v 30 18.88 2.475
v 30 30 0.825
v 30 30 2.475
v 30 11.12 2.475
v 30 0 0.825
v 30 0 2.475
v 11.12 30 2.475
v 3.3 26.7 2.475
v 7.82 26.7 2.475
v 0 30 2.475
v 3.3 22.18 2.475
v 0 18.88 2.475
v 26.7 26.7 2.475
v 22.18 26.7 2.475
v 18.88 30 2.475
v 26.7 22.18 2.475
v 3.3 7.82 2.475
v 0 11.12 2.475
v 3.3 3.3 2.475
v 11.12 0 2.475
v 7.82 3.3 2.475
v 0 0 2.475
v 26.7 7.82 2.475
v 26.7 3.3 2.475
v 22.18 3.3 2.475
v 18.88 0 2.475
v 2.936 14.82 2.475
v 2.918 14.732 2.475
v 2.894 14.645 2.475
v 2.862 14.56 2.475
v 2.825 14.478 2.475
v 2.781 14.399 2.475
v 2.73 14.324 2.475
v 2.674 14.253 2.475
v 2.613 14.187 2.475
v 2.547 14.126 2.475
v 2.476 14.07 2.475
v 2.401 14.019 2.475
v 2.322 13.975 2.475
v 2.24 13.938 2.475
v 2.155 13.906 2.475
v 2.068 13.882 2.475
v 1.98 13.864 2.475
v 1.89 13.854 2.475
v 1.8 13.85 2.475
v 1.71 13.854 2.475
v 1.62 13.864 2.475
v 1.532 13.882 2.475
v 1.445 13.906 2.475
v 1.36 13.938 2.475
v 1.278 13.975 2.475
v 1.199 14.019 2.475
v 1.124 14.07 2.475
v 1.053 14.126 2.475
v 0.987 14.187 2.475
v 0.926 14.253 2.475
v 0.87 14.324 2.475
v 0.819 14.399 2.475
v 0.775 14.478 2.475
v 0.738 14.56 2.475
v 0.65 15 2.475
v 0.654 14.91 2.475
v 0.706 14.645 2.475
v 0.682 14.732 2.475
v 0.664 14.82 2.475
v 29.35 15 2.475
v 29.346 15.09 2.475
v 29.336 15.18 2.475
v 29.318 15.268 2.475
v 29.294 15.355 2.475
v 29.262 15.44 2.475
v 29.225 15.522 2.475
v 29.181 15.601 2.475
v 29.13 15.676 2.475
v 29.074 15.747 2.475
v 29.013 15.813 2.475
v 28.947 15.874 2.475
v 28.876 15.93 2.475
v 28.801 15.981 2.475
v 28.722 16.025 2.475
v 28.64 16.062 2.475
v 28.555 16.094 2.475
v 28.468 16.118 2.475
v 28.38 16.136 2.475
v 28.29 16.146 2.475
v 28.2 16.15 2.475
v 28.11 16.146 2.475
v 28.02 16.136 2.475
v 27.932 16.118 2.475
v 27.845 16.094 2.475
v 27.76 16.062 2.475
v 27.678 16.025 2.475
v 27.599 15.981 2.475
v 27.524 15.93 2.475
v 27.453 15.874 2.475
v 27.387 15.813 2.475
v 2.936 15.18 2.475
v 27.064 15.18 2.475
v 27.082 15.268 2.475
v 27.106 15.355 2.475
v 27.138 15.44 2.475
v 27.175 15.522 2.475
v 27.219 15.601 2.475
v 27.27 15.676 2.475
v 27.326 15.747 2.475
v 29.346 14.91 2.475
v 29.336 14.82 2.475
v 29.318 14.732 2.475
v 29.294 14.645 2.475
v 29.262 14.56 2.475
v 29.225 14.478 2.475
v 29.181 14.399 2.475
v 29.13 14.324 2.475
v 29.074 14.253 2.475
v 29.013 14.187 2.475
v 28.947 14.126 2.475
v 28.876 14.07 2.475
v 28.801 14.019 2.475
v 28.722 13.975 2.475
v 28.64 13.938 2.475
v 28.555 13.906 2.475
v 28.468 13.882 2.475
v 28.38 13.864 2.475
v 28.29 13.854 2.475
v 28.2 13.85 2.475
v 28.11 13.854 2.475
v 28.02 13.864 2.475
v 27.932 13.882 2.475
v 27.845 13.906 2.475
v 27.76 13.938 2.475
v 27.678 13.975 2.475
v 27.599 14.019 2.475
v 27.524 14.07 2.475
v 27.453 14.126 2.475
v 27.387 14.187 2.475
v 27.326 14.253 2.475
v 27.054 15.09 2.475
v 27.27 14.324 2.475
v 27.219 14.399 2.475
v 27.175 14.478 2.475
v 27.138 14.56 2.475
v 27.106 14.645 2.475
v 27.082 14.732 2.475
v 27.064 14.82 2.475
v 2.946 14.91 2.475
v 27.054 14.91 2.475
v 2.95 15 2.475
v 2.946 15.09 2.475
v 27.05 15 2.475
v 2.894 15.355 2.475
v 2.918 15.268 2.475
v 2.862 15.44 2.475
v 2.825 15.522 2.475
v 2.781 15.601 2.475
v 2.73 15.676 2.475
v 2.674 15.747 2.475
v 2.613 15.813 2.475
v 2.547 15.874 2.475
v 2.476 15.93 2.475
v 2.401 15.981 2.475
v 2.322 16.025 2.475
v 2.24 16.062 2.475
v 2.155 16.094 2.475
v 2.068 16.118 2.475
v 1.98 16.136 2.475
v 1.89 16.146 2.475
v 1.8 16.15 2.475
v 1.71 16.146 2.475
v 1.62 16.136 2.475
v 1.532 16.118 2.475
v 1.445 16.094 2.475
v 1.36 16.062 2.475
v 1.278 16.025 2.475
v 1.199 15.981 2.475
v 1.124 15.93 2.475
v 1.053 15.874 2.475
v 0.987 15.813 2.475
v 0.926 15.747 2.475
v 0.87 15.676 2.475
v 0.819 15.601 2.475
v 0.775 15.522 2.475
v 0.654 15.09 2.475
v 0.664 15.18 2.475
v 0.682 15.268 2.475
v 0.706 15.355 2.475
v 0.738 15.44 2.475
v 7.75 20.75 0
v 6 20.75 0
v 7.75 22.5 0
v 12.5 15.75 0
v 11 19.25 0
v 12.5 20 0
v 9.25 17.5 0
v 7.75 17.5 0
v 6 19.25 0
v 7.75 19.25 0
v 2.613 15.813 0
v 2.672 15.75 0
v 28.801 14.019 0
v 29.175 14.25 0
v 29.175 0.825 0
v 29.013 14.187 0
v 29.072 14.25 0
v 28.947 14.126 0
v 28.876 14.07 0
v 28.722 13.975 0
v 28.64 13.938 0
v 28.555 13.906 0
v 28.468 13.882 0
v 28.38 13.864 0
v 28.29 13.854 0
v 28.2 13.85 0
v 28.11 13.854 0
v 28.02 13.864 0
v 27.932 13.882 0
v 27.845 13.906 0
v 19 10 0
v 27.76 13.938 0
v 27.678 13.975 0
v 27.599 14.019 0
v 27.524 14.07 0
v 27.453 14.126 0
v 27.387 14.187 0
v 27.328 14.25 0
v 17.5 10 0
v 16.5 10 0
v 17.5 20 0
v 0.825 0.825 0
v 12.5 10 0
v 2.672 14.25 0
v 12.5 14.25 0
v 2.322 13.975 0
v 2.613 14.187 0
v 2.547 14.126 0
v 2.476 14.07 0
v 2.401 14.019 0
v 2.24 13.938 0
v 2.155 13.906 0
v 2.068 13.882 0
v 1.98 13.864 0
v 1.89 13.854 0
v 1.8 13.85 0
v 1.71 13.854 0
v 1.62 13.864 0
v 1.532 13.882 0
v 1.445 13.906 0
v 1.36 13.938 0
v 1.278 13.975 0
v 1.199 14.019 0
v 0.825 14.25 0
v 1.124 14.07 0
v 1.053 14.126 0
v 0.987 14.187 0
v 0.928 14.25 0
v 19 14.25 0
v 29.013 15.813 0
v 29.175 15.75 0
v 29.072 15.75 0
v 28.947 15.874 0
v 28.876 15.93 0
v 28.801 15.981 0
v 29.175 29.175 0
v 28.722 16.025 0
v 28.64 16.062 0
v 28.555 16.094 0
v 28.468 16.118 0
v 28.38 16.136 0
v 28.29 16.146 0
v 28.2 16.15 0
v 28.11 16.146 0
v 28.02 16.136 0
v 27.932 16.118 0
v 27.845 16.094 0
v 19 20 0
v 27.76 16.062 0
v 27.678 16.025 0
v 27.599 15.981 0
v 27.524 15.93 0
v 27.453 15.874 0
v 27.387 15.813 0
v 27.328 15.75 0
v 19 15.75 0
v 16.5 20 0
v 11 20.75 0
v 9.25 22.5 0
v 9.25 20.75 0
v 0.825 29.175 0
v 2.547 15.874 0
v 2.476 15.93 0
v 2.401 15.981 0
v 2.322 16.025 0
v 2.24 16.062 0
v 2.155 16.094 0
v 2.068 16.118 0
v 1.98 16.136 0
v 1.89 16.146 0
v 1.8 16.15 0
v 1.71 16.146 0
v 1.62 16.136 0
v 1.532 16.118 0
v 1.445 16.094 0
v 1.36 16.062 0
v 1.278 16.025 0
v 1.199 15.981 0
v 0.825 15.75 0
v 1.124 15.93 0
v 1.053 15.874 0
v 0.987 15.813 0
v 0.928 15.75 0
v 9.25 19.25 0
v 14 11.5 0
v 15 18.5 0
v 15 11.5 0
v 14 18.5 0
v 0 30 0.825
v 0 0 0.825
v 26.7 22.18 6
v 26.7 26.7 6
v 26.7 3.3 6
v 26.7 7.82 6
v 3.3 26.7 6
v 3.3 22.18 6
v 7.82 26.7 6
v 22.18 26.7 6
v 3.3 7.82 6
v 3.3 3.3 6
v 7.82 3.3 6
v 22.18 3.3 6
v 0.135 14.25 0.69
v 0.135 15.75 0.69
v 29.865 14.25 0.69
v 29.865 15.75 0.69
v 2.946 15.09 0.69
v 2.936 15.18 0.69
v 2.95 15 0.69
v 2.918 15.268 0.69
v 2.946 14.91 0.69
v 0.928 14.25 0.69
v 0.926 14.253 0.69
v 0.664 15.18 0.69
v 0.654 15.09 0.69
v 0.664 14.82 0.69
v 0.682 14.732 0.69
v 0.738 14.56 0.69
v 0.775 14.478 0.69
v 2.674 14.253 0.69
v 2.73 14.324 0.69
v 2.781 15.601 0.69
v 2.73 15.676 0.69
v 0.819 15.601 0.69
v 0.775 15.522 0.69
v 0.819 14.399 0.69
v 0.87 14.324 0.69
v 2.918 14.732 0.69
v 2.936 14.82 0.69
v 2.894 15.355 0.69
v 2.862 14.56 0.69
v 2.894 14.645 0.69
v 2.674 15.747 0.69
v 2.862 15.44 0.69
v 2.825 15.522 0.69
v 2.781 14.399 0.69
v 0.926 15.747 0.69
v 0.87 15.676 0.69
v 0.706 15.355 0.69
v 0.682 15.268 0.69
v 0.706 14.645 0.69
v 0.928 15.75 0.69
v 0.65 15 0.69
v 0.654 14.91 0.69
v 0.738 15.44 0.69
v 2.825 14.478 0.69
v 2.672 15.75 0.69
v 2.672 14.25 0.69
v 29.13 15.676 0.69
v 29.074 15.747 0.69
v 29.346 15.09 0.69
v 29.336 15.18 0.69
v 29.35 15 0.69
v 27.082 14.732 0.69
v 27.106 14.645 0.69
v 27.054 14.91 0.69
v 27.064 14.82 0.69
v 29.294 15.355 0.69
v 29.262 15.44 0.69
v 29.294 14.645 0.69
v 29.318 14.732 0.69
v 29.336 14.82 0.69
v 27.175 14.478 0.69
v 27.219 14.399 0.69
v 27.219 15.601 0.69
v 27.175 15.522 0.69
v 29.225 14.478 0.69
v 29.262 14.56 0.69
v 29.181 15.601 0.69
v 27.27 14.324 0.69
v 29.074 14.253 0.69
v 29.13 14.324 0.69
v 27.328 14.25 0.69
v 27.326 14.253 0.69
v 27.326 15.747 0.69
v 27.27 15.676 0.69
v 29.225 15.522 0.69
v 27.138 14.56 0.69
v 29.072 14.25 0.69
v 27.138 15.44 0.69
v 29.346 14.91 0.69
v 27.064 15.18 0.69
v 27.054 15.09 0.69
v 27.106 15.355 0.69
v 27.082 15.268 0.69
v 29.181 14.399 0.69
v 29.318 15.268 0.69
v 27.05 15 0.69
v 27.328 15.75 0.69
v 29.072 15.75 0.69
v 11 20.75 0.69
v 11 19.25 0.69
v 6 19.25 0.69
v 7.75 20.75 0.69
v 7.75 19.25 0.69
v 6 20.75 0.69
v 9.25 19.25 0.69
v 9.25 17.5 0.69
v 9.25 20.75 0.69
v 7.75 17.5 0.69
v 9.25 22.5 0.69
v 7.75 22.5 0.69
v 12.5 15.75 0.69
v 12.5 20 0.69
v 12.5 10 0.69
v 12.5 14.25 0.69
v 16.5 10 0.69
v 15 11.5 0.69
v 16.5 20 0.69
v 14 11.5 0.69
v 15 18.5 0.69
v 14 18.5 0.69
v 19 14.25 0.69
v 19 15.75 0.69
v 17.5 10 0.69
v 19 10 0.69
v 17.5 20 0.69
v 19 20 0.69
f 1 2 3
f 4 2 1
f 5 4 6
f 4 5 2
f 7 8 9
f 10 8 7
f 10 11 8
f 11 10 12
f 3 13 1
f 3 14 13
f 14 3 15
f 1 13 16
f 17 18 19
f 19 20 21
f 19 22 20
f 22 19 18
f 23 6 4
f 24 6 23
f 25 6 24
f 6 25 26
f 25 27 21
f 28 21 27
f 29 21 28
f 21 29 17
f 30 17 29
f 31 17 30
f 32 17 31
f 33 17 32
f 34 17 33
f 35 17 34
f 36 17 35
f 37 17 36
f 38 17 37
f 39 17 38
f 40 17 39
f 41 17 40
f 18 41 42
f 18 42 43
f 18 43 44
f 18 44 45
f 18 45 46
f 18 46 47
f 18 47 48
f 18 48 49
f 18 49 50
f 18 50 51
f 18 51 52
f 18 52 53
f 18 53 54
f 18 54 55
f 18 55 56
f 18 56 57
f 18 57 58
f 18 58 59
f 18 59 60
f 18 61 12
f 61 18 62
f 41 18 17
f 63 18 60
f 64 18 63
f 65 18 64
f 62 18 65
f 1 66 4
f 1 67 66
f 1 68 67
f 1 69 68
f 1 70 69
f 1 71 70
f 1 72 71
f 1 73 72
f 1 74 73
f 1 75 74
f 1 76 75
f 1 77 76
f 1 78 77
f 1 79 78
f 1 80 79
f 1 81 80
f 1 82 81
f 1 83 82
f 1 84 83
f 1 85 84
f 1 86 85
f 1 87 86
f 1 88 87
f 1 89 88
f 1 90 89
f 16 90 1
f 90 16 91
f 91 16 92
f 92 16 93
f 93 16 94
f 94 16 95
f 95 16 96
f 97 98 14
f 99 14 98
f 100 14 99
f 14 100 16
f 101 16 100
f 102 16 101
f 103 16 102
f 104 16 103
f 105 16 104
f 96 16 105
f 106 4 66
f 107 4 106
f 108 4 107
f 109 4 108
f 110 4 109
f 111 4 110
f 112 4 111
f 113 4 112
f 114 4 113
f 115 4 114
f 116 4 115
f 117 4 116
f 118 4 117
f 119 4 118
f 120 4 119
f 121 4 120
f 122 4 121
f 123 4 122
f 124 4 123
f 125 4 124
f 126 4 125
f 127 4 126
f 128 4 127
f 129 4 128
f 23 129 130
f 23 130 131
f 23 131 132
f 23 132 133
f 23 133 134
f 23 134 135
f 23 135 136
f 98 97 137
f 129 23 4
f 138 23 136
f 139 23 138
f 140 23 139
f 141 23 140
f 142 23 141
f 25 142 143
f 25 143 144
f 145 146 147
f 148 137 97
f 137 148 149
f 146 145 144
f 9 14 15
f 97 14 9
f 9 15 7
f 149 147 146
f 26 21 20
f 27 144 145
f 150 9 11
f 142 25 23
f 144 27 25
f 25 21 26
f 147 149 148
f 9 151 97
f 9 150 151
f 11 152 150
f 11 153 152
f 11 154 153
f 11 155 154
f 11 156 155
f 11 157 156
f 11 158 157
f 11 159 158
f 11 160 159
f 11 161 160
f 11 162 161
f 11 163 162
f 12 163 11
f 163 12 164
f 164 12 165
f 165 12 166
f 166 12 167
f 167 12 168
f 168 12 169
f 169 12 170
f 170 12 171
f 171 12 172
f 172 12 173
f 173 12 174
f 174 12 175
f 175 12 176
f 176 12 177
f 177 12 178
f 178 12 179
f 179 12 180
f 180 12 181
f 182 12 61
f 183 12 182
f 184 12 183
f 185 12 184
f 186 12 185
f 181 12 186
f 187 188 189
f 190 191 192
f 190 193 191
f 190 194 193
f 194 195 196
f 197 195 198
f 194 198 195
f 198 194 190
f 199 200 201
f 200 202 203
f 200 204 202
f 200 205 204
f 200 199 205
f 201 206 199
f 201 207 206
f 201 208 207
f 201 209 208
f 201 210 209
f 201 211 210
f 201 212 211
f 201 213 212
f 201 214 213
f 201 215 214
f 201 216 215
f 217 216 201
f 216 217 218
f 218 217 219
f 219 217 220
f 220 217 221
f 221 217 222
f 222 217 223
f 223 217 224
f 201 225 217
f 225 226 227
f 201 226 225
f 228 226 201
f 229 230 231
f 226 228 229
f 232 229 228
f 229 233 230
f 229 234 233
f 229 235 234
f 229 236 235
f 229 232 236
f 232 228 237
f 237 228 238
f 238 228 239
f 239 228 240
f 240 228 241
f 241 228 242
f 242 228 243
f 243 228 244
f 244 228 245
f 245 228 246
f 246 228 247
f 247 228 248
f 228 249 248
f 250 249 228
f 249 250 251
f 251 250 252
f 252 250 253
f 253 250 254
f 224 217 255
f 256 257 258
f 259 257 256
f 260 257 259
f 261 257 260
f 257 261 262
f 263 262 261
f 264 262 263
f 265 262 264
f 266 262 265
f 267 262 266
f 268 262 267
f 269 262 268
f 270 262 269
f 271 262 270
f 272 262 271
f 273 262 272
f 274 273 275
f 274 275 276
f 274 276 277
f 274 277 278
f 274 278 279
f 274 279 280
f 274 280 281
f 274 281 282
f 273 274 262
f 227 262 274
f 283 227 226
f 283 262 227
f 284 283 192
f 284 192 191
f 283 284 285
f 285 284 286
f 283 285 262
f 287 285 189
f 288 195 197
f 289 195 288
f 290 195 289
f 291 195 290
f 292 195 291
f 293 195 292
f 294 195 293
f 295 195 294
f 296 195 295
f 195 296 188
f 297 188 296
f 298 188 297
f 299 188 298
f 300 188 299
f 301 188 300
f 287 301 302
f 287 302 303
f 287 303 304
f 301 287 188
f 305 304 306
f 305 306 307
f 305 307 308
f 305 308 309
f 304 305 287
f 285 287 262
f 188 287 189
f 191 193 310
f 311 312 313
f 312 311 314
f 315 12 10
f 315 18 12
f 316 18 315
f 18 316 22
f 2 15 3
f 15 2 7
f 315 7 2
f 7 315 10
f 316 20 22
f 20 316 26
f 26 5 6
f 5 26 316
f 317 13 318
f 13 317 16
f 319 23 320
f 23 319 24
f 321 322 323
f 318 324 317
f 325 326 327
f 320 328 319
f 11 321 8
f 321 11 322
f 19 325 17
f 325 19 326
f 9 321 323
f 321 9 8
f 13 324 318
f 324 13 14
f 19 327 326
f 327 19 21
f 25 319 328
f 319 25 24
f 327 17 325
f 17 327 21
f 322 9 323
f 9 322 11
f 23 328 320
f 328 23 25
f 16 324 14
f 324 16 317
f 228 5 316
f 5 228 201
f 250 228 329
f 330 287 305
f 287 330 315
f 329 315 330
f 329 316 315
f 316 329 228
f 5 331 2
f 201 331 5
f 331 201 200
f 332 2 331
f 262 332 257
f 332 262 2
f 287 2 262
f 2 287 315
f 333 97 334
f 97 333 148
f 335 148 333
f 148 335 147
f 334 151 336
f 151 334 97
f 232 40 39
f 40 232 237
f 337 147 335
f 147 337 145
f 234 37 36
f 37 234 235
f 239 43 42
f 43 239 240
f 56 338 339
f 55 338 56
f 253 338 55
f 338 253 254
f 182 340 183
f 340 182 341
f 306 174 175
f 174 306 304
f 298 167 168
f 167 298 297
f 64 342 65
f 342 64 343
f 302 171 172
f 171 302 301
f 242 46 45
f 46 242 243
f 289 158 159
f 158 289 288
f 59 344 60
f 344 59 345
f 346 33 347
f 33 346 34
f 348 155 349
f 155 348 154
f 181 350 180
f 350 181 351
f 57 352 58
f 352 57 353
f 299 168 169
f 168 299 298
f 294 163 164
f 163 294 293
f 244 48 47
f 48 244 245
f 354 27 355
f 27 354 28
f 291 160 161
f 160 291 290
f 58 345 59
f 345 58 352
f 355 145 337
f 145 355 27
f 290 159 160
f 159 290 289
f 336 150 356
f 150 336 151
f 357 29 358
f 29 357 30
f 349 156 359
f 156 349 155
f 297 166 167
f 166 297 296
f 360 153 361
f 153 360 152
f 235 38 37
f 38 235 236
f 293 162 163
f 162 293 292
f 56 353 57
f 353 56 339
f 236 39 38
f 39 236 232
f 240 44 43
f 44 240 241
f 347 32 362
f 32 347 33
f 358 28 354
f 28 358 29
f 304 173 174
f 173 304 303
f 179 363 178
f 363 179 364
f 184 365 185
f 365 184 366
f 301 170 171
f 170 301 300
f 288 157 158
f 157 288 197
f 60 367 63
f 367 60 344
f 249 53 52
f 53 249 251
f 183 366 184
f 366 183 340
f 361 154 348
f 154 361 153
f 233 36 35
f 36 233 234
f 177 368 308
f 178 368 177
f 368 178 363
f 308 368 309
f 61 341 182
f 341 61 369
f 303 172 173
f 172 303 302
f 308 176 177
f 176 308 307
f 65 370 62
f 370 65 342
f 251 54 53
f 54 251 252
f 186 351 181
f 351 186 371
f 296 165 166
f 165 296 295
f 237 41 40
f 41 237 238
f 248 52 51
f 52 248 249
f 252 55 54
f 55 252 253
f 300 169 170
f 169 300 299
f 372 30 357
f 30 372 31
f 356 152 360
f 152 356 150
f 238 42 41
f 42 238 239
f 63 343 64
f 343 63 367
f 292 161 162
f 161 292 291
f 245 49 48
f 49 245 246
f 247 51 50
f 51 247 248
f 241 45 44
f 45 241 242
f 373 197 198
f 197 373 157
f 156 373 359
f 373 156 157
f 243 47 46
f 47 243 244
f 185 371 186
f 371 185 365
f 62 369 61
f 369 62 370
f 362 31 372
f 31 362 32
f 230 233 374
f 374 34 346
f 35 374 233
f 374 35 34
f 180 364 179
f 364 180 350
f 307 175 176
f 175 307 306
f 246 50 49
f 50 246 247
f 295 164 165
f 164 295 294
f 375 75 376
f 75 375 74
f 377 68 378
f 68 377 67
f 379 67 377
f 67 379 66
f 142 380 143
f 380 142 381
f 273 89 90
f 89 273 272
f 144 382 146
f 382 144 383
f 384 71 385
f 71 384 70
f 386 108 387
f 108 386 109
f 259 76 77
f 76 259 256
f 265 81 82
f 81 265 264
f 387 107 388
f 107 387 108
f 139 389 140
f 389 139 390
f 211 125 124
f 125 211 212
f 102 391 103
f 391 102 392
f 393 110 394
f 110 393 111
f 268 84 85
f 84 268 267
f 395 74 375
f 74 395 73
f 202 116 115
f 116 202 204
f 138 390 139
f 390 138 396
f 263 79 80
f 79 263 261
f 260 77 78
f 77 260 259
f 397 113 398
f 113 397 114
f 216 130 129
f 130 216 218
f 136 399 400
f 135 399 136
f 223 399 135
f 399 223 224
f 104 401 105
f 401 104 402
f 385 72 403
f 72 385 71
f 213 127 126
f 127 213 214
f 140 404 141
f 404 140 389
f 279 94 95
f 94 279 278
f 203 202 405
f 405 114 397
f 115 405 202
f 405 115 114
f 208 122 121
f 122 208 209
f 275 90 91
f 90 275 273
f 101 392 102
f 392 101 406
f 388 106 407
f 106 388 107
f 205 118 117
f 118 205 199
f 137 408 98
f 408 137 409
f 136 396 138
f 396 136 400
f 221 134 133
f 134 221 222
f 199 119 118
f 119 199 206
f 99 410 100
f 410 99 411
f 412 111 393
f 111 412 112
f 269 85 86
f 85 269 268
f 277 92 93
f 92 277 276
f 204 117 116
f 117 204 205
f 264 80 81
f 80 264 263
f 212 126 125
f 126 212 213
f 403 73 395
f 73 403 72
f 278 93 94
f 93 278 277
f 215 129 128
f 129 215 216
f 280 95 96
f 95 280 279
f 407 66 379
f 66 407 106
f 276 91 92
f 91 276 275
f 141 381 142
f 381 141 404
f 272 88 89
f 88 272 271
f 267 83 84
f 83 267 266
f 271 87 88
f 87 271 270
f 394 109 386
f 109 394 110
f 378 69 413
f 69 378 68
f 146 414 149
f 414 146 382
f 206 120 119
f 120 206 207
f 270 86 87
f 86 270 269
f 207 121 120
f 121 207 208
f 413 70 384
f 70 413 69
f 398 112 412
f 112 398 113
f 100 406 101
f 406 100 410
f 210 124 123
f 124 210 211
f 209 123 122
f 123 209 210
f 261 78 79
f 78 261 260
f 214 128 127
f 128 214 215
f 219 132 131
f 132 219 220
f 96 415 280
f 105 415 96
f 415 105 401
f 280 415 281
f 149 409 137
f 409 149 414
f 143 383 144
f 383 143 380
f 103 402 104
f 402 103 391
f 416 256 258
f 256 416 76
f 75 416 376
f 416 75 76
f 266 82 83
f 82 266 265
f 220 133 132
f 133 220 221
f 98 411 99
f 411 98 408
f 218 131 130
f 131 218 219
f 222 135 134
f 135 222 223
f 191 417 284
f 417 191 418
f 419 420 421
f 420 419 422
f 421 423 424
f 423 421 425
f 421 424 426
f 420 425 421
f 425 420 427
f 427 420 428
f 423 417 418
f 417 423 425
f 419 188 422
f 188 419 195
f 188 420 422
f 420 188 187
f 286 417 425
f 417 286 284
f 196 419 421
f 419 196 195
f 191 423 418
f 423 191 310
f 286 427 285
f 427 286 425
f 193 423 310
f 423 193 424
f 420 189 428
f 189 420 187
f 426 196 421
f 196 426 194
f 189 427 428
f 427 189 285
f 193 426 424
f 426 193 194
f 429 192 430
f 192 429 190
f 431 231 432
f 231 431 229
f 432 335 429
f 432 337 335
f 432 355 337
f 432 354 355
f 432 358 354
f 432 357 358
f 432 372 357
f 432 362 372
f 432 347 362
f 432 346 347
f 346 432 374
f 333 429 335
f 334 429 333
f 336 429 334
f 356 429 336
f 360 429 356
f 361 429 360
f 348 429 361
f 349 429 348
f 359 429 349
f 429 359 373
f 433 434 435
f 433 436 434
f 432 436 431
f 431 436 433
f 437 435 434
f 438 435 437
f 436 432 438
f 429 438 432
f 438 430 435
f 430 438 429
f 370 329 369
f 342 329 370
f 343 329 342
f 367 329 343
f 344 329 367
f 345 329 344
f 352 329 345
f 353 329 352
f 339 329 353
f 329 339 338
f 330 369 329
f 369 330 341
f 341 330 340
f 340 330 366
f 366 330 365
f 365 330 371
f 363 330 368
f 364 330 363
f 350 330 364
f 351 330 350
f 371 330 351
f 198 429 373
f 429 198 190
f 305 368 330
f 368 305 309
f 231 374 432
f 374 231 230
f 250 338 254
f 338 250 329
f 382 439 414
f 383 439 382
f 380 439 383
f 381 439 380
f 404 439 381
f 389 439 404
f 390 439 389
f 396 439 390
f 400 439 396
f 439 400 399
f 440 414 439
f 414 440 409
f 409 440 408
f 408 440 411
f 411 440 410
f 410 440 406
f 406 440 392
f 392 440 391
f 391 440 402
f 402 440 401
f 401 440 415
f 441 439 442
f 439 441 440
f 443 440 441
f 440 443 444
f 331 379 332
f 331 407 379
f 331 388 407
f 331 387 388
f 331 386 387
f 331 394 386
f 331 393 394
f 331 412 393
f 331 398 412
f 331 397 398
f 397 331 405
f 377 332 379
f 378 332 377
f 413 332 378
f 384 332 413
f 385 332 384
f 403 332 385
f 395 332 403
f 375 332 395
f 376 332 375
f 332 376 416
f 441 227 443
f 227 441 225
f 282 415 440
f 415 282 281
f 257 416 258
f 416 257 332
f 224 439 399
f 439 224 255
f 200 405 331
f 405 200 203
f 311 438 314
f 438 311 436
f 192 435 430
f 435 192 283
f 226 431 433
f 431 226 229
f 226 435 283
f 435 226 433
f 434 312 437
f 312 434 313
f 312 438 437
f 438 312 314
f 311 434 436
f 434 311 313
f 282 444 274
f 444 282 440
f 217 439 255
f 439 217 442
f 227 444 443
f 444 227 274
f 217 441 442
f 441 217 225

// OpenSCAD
// file: sym_plus.scad
module plus(size, thickness, height)
{
    translate([-size/2,-thickness/2, 0]) cube([size, thickness, height]);
    translate([-thickness/2,-size/2, 0]) cube([thickness, size, height]);
}
// file: settings.scad
cube_width=30;
cube_height=16;
cube_thickness=3.3;

cap_width=30;
cap_height=6;
cap_thickness=3.3;

glyph_depth=0.7;
glyph_thickness=1.5;

photo_resitor_hole_r = 3.1;
spring_contact_hole_r = 3.35;
// file: sym_capacitor_polar.scad
use <sym_plus.scad>

module capacitor_polar(length, width, thickness, height)
{
    //left wire
    translate([0,-thickness/2,0])cube([length/2-width/4, thickness, height]);
    translate([(length/2+width/4),-thickness/2,0])cube([(length/2-width/4), thickness, height]);
    
    //left vertical
    translate([(length-width/2)/2,-width/2, 0])cube([thickness, width, height]);
    
    //middle vertical
    translate([(length)/2,-width/2, 0])cube([thickness, width, height]);
    
    //bottom horizontal
    translate([(length-width/2)/2,width/2-thickness,0]) cube([width/4,thickness,height]);
    
    //top horizontal
    translate([(length-width/2)/2,-width/2,0]) cube([width/4,thickness,height]);
    
    //+
    translate([length/2-width/2-thickness, 2*width/4,0]) plus(width/2, thickness, height);
    
    //right vertical
    translate([(length+width/2)/2,-width/2, 0])cube([thickness, width, height]);
}

capacitor_polar(30, 12, 1, 1);
// file: cap_1x1.scad
include <settings.scad>

module cap_1x1(width, height, thickness, holes_mask)
{
    width1=width-thickness;
    difference()
    {
        union()
        {
            cube([width, width, thickness*3/4]);
            translate([thickness,thickness,0])cube([width-2*thickness, width-2*thickness, height]);
        }
        union()
        {
            translate([width/2,width/2,0])rotate([0,0,45])translate([-width1/2,-width1/2,thickness*3/4]) cube([width1,width1,height]);
                        //corners
            translate([0,0.25*thickness,0])rotate([45,0,0]) translate([-0.5*width, -width, -0.5*height]) cube([2*width, width, 2*height]);
            translate([0.25*thickness,0,0]) rotate([0,-45,0]) translate([-width, -0.5*width, -0.5*height]) cube([width, 2*width, 2*height]);
            translate([width-0.25*thickness,0,0]) rotate([0,45,0]) translate([0, 0, -0.5*height]) cube([width, 2*width, 2*height]);
            translate([0,width-0.25*thickness,0]) rotate([-45,0,0]) translate([-0.5*width, 0, -0.5*height]) cube([2*width, width, 2*height]);
            
            if (holes_mask >= 8)
            {
                translate([width/2, thickness-1.5, -0.5]) cylinder(r=1.15, h=height*1.5, $fn=80);
            }
            if ((holes_mask%8) >= 4)
            {
                translate([width/2, width-thickness+1.5, -0.5]) cylinder(r=1.15, h=height*1.5, $fn=80);
            }
            if ((holes_mask%4)>= 2)
            {
                translate([thickness-1.5, width/2, -0.5]) cylinder(r=1.15, h=height*1.5, $fn=80);
            }
            if (holes_mask%2 >= 1)
            {
                translate([width-thickness+1.5, width/2, -0.5]) cylinder(r=1.15, h=height*1.5, $fn=80);
            }
        }
    }
}

cap_1x1(cap_width, cap_height, cap_thickness, 9);
//ring(10,1,1);
//arrow(1, 20, 3, 1);
//transistor_npn(30, 1, 1);
// main file
use <cap_1x1.scad>
use <sym_capacitor_polar.scad>
include <settings.scad>

module cap_1x1_capacitor_polar(width, height, thickness)
{
    difference()
    {
        cap_1x1(width, height, thickness, 3);
        translate([0,width/2,-0.01]) capacitor_polar(width, width/3, glyph_thickness, glyph_depth);
    }
}

cap_1x1_capacitor_polar(cap_width, cap_height, cap_thickness);
